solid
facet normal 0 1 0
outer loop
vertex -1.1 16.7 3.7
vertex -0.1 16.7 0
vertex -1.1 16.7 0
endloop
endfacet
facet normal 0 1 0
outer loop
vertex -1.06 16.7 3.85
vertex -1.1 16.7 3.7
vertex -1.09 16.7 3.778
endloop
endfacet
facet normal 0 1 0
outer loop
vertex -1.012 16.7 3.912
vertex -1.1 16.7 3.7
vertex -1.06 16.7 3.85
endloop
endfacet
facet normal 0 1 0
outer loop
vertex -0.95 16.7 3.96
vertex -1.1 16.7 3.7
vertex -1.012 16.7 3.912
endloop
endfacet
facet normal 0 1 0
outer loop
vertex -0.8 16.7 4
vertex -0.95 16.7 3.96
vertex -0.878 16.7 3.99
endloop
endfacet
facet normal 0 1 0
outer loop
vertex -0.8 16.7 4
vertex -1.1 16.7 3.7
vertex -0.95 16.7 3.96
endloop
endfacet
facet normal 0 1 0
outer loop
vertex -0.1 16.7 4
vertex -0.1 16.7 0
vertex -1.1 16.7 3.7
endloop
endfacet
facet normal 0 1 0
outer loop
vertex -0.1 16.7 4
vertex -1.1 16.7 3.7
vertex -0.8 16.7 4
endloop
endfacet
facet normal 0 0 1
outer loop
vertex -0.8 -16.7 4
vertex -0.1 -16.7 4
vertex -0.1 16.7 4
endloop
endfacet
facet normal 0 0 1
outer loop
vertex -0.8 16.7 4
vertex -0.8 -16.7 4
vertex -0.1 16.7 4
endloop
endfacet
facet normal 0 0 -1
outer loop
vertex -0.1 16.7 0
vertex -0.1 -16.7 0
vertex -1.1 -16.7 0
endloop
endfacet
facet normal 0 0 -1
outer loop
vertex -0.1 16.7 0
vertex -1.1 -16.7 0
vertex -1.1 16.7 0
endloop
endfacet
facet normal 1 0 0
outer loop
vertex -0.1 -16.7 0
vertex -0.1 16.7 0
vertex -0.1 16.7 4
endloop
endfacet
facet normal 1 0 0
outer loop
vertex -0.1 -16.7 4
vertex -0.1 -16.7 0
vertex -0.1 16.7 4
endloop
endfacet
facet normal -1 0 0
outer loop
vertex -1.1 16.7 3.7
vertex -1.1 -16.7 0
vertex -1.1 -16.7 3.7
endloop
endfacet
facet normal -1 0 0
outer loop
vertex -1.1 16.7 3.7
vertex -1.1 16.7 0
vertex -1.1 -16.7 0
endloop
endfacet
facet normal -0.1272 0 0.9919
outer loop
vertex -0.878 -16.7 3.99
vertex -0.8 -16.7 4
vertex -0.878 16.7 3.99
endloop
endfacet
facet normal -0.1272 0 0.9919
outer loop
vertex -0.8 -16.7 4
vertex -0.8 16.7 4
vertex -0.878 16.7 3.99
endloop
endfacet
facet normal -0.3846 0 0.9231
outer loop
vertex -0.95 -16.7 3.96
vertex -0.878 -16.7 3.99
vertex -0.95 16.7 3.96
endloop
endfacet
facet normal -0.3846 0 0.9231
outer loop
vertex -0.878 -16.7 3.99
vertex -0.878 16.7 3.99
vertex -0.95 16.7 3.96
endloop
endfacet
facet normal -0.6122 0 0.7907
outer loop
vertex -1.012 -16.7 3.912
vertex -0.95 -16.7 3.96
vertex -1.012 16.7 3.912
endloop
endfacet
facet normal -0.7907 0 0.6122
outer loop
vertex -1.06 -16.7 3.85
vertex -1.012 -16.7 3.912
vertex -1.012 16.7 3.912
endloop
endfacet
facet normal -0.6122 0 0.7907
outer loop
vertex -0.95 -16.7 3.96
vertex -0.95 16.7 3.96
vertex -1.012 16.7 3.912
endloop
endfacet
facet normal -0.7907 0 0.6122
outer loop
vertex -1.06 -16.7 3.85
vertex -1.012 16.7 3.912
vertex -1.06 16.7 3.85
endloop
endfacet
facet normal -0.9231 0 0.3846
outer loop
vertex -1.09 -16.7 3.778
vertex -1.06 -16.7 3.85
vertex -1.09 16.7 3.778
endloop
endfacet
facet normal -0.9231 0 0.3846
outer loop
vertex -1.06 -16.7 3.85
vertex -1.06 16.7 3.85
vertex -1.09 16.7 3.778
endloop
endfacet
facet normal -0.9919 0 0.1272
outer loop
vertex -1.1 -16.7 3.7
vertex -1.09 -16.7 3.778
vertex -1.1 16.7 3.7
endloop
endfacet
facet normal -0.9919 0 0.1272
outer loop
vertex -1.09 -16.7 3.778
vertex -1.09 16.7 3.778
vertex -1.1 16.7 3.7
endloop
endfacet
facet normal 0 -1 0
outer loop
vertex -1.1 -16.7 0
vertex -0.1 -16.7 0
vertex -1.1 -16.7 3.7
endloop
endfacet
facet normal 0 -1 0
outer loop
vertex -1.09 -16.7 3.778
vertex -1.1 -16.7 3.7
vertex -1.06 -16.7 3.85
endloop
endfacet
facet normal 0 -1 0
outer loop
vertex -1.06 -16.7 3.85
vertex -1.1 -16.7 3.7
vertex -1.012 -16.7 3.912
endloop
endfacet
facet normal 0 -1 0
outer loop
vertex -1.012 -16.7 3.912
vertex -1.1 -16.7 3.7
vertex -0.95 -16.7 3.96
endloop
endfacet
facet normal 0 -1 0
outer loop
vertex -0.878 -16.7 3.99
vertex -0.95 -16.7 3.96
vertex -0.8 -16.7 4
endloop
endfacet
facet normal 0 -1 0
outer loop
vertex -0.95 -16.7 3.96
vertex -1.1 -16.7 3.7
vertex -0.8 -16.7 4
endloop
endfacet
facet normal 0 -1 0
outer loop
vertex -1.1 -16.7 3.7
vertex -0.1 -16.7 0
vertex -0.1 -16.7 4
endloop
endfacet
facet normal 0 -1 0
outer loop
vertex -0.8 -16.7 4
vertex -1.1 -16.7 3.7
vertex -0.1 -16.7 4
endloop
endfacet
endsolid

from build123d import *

# Parameters (mm, degrees)
SKETCH_1_W      = 4
SKETCH_1_H      = 33.4
EXTRUDE_1_DEPTH = 1
FILLET_1_R      = 0.3


with BuildPart() as part:
    # Эскиз1 → Бобышка-Вытянуть1 (new body)
    with BuildSketch(Plane.ZY.offset(0.1)):
        with Locations((2, 0)):
            Rectangle(SKETCH_1_W, SKETCH_1_H)
    extrude(amount=EXTRUDE_1_DEPTH)

    # Скругление1
    fillet_1_edges = [part.edges().sort_by_distance(p)[0] for p in [
        (-1.1, 0, 4),
    ]]
    fillet(fillet_1_edges, radius=FILLET_1_R)


solid = part.part
